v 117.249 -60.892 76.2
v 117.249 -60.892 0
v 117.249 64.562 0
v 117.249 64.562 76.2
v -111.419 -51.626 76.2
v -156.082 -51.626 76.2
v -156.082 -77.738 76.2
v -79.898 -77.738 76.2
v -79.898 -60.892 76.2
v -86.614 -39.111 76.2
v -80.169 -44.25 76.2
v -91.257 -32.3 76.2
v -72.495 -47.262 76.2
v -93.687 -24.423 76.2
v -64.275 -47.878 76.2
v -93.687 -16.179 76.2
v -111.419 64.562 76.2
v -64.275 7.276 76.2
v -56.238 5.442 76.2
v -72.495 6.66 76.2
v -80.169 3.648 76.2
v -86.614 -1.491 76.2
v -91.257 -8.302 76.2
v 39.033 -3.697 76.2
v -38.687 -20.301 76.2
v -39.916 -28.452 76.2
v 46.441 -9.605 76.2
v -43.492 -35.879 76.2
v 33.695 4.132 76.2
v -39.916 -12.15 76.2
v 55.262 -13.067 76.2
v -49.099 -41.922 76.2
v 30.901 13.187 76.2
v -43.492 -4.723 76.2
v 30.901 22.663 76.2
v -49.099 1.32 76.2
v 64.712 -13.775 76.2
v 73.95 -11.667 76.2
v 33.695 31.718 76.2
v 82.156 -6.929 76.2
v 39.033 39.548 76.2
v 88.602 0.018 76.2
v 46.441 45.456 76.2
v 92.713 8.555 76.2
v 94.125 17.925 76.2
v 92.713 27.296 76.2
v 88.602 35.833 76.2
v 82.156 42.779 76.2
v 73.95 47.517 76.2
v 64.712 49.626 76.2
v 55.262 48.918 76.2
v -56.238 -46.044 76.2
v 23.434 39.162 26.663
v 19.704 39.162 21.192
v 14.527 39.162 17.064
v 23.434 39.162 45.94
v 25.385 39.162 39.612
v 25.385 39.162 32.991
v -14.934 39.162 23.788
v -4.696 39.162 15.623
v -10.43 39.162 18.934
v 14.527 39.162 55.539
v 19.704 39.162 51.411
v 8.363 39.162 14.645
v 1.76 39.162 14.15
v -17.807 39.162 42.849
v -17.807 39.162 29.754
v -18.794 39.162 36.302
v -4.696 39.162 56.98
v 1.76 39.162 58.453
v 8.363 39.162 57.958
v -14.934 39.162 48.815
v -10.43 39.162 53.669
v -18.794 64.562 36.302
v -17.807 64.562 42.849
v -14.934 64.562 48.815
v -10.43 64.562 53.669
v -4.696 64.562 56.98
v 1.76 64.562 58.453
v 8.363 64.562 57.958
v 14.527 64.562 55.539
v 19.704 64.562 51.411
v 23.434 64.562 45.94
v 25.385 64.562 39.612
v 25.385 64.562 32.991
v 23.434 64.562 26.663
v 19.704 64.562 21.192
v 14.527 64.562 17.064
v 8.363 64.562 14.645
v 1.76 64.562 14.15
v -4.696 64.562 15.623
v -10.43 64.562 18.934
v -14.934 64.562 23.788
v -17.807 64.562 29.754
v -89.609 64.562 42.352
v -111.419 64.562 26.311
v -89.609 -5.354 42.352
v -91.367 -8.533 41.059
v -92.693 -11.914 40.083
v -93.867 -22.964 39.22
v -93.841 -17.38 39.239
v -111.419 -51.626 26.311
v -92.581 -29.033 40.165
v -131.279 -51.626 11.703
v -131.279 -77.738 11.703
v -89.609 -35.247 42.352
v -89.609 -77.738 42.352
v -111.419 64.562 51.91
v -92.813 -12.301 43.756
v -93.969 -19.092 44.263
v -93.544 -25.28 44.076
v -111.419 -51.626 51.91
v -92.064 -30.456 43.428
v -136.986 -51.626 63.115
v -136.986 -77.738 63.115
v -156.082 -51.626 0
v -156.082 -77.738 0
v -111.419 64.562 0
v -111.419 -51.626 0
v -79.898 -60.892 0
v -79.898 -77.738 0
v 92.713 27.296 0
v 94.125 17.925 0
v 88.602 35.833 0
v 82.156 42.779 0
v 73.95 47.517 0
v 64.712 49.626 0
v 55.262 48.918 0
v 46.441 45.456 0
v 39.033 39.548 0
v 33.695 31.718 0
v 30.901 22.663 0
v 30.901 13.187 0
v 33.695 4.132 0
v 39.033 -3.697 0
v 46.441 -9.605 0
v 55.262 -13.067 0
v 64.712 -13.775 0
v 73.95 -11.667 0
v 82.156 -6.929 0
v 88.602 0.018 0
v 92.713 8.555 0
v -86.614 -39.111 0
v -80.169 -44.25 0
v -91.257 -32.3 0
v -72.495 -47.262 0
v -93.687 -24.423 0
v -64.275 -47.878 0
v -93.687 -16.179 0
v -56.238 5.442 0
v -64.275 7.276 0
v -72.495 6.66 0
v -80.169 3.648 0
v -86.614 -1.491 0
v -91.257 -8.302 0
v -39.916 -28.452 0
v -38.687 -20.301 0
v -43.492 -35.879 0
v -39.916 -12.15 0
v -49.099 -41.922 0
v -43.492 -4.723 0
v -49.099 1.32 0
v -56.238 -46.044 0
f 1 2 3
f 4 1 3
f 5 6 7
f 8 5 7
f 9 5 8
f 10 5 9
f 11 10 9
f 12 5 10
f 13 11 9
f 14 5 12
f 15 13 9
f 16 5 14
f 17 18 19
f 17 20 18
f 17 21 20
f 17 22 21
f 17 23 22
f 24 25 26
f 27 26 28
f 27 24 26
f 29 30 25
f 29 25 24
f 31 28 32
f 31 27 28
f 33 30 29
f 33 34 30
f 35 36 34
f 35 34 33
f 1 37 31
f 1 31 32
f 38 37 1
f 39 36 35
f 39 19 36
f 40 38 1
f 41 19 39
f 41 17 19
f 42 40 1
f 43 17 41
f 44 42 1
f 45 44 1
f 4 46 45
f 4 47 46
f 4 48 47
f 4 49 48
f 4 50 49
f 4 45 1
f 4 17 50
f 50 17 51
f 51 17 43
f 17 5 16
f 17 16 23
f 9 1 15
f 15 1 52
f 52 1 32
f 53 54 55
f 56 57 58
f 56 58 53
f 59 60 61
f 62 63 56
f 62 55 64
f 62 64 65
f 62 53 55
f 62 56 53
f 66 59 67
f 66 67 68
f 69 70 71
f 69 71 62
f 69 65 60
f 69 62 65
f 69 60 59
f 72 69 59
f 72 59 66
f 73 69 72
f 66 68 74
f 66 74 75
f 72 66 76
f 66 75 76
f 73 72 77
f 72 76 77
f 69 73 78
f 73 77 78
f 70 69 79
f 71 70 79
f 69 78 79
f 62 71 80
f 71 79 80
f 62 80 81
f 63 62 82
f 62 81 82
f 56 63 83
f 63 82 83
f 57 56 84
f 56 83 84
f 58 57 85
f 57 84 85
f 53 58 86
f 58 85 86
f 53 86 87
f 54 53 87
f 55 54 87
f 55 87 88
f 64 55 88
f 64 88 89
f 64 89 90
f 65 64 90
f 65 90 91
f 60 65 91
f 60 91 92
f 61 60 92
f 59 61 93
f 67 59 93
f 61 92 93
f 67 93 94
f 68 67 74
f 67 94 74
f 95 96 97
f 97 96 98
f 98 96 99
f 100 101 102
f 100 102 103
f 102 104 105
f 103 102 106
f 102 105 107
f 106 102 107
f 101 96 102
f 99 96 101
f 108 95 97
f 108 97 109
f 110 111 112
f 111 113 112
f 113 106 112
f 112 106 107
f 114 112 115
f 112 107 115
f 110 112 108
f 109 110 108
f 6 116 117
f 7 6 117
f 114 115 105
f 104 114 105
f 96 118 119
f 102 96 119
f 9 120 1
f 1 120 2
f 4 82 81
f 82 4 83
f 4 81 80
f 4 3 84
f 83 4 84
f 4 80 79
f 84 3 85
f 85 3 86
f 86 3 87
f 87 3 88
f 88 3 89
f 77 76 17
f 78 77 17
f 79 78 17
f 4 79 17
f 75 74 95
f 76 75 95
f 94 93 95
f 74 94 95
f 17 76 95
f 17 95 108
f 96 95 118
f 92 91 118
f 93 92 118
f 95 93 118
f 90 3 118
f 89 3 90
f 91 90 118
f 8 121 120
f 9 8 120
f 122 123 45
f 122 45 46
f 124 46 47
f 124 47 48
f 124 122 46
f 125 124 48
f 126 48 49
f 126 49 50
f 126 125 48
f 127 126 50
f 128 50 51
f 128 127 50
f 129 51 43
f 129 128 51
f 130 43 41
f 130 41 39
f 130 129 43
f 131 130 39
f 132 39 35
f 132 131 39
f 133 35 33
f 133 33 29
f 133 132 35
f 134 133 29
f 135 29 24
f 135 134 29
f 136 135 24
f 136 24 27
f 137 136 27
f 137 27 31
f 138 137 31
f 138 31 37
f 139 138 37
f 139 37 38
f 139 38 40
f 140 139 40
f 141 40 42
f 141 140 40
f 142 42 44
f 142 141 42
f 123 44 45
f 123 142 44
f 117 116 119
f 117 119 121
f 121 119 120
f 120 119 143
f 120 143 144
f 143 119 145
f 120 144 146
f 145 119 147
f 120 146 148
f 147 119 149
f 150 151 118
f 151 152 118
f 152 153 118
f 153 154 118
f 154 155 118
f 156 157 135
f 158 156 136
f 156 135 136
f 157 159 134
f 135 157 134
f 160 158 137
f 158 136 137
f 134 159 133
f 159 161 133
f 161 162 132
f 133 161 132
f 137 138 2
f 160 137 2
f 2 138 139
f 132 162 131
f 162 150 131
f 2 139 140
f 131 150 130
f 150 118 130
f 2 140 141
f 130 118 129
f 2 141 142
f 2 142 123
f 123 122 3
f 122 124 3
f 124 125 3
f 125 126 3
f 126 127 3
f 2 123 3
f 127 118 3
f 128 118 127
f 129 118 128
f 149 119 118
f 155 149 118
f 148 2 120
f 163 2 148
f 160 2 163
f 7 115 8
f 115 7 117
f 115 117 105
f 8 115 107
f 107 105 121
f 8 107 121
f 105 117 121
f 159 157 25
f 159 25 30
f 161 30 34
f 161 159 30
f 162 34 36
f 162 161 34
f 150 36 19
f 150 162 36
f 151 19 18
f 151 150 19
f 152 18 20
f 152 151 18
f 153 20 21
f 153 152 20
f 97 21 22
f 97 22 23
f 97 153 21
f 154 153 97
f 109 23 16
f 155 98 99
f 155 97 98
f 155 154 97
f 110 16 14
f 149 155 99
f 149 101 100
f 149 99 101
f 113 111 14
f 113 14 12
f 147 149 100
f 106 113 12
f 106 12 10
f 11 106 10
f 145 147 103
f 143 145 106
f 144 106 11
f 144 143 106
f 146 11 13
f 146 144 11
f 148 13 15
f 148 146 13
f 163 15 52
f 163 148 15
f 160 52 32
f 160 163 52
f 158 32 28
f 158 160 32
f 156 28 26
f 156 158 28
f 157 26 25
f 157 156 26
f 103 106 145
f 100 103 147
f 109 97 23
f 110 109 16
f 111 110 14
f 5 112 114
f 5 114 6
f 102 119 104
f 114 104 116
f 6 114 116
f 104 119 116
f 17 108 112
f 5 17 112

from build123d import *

# Parameters (mm, degrees)
F0_R     = 27.654289
F0_R_2   = 31.789504
F1_DEPTH = 76.2
F3_R     = 22.213723
F4_DEPTH = 25.4
F5_DEPTH = 157.734


with BuildPart() as f1:
    # F0 (on Top) → F1 (new body)
    with BuildSketch(Plane.XY):
        Polygon((117.248647, 64.562328), (-111.418605, 64.562328), (-111.418605, -51.62568), (-156.081602, -51.62568), (-156.081602, -77.738054), (-79.898089, -77.738054), (-79.898089, -60.891561), (117.248647, -60.891561), align=None)
        with Locations((-66.341519, -20.300921)):
            Circle(F0_R, mode=Mode.SUBTRACT)
        with Locations((62.335916, 17.92543)):
            Circle(F0_R_2, mode=Mode.SUBTRACT)
    extrude(amount=F1_DEPTH)

    # F3 (on face) → F4 (cut)
    with BuildSketch(Plane(origin=(0, 64.562328, 0), x_dir=(-1, 0, 0), z_dir=(0, 1, 0))):
        with Locations((-3.41973, 36.301557)):
            Circle(F3_R)
    extrude(amount=-F4_DEPTH, mode=Mode.SUBTRACT)

    # F2 (on face) → F5 (cut)
    with BuildSketch(Plane.XZ.offset(77.738054)):
        Polygon((-131.27912, 11.703248), (-89.60872, 42.351646), (-136.986211, 63.115072), align=None)
    extrude(amount=-F5_DEPTH, mode=Mode.SUBTRACT)


solid = f1.part
